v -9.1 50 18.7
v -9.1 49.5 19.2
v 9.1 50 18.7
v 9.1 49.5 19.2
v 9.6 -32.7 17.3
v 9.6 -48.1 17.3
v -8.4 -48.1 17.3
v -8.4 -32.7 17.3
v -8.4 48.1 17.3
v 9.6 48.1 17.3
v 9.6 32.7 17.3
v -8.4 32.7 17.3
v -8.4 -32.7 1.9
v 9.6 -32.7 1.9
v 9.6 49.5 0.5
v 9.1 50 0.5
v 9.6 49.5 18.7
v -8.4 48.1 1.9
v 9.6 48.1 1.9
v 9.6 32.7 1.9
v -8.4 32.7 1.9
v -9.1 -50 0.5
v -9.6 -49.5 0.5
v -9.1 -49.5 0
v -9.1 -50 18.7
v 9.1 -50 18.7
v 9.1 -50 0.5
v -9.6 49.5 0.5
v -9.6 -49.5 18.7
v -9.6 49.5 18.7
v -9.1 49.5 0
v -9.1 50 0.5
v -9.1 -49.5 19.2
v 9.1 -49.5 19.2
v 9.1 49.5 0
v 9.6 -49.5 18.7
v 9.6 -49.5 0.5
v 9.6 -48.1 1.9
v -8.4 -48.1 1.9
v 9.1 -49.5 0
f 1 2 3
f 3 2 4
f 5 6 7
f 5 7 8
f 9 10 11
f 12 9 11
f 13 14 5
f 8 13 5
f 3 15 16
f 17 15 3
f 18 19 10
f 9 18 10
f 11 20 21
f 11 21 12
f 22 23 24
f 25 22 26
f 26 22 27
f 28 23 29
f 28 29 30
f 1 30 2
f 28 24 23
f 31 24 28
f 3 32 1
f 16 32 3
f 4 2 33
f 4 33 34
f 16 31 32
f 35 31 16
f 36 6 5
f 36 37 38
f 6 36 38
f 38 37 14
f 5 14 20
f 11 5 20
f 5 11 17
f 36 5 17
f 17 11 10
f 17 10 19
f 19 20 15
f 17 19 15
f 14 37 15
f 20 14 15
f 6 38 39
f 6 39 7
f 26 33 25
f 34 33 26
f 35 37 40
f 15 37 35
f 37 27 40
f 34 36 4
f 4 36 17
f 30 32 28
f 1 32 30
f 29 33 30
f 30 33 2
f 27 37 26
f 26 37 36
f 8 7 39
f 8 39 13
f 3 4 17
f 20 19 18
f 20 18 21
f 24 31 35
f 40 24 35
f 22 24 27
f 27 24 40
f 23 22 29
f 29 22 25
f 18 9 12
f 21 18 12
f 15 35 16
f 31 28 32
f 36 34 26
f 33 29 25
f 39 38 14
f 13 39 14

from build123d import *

# Parameters (mm, degrees)
F0_W     = 19.2
F0_H     = 100
F1_DEPTH = 19.2
F2_W     = 15.4
F2_H     = 15.4
F3_DEPTH = 18
F4_SIZE  = 0.5


# Not quite as in the source:
# - a pattern or mirror of a feature is missing from the dataset's text; its kind, count and spacing are read off the source's solid


with BuildPart() as f1:
    # F0 (on Top) → F1 (new body)
    with BuildSketch(Plane.XY):
        Rectangle(F0_W, F0_H)
    extrude(amount=F1_DEPTH)

    # F2 (on face) → F3 (cut)
    with BuildSketch(Plane.YZ.offset(9.6)):
        with Locations((-40.4, 9.6)):
            Rectangle(F2_W, F2_H)
    f3 = extrude(amount=-F3_DEPTH, mode=Mode.SUBTRACT)

    # F3_copies: F3 across plane
    add(f3.mirror(Plane.ZX), mode=Mode.SUBTRACT)

    # F4
    f4_edges = [f1.edges().sort_by_distance(p)[0] for p in [
        (-9.6, 50, 9.6),
        (-9.6, -50, 9.6),
        (-9.6, 0, 0),
        (-9.6, 0, 19.2),
        (0, -50, 19.2),
        (9.6, 0, 19.2),
        (0, 50, 19.2),
        (9.6, -50, 9.6),
        (0, -50, 0),
        (9.6, 0, 0),
        (0, 50, 0),
        (9.6, 50, 9.6),
    ]]
    chamfer(f4_edges, length=F4_SIZE)


solid = f1.part
